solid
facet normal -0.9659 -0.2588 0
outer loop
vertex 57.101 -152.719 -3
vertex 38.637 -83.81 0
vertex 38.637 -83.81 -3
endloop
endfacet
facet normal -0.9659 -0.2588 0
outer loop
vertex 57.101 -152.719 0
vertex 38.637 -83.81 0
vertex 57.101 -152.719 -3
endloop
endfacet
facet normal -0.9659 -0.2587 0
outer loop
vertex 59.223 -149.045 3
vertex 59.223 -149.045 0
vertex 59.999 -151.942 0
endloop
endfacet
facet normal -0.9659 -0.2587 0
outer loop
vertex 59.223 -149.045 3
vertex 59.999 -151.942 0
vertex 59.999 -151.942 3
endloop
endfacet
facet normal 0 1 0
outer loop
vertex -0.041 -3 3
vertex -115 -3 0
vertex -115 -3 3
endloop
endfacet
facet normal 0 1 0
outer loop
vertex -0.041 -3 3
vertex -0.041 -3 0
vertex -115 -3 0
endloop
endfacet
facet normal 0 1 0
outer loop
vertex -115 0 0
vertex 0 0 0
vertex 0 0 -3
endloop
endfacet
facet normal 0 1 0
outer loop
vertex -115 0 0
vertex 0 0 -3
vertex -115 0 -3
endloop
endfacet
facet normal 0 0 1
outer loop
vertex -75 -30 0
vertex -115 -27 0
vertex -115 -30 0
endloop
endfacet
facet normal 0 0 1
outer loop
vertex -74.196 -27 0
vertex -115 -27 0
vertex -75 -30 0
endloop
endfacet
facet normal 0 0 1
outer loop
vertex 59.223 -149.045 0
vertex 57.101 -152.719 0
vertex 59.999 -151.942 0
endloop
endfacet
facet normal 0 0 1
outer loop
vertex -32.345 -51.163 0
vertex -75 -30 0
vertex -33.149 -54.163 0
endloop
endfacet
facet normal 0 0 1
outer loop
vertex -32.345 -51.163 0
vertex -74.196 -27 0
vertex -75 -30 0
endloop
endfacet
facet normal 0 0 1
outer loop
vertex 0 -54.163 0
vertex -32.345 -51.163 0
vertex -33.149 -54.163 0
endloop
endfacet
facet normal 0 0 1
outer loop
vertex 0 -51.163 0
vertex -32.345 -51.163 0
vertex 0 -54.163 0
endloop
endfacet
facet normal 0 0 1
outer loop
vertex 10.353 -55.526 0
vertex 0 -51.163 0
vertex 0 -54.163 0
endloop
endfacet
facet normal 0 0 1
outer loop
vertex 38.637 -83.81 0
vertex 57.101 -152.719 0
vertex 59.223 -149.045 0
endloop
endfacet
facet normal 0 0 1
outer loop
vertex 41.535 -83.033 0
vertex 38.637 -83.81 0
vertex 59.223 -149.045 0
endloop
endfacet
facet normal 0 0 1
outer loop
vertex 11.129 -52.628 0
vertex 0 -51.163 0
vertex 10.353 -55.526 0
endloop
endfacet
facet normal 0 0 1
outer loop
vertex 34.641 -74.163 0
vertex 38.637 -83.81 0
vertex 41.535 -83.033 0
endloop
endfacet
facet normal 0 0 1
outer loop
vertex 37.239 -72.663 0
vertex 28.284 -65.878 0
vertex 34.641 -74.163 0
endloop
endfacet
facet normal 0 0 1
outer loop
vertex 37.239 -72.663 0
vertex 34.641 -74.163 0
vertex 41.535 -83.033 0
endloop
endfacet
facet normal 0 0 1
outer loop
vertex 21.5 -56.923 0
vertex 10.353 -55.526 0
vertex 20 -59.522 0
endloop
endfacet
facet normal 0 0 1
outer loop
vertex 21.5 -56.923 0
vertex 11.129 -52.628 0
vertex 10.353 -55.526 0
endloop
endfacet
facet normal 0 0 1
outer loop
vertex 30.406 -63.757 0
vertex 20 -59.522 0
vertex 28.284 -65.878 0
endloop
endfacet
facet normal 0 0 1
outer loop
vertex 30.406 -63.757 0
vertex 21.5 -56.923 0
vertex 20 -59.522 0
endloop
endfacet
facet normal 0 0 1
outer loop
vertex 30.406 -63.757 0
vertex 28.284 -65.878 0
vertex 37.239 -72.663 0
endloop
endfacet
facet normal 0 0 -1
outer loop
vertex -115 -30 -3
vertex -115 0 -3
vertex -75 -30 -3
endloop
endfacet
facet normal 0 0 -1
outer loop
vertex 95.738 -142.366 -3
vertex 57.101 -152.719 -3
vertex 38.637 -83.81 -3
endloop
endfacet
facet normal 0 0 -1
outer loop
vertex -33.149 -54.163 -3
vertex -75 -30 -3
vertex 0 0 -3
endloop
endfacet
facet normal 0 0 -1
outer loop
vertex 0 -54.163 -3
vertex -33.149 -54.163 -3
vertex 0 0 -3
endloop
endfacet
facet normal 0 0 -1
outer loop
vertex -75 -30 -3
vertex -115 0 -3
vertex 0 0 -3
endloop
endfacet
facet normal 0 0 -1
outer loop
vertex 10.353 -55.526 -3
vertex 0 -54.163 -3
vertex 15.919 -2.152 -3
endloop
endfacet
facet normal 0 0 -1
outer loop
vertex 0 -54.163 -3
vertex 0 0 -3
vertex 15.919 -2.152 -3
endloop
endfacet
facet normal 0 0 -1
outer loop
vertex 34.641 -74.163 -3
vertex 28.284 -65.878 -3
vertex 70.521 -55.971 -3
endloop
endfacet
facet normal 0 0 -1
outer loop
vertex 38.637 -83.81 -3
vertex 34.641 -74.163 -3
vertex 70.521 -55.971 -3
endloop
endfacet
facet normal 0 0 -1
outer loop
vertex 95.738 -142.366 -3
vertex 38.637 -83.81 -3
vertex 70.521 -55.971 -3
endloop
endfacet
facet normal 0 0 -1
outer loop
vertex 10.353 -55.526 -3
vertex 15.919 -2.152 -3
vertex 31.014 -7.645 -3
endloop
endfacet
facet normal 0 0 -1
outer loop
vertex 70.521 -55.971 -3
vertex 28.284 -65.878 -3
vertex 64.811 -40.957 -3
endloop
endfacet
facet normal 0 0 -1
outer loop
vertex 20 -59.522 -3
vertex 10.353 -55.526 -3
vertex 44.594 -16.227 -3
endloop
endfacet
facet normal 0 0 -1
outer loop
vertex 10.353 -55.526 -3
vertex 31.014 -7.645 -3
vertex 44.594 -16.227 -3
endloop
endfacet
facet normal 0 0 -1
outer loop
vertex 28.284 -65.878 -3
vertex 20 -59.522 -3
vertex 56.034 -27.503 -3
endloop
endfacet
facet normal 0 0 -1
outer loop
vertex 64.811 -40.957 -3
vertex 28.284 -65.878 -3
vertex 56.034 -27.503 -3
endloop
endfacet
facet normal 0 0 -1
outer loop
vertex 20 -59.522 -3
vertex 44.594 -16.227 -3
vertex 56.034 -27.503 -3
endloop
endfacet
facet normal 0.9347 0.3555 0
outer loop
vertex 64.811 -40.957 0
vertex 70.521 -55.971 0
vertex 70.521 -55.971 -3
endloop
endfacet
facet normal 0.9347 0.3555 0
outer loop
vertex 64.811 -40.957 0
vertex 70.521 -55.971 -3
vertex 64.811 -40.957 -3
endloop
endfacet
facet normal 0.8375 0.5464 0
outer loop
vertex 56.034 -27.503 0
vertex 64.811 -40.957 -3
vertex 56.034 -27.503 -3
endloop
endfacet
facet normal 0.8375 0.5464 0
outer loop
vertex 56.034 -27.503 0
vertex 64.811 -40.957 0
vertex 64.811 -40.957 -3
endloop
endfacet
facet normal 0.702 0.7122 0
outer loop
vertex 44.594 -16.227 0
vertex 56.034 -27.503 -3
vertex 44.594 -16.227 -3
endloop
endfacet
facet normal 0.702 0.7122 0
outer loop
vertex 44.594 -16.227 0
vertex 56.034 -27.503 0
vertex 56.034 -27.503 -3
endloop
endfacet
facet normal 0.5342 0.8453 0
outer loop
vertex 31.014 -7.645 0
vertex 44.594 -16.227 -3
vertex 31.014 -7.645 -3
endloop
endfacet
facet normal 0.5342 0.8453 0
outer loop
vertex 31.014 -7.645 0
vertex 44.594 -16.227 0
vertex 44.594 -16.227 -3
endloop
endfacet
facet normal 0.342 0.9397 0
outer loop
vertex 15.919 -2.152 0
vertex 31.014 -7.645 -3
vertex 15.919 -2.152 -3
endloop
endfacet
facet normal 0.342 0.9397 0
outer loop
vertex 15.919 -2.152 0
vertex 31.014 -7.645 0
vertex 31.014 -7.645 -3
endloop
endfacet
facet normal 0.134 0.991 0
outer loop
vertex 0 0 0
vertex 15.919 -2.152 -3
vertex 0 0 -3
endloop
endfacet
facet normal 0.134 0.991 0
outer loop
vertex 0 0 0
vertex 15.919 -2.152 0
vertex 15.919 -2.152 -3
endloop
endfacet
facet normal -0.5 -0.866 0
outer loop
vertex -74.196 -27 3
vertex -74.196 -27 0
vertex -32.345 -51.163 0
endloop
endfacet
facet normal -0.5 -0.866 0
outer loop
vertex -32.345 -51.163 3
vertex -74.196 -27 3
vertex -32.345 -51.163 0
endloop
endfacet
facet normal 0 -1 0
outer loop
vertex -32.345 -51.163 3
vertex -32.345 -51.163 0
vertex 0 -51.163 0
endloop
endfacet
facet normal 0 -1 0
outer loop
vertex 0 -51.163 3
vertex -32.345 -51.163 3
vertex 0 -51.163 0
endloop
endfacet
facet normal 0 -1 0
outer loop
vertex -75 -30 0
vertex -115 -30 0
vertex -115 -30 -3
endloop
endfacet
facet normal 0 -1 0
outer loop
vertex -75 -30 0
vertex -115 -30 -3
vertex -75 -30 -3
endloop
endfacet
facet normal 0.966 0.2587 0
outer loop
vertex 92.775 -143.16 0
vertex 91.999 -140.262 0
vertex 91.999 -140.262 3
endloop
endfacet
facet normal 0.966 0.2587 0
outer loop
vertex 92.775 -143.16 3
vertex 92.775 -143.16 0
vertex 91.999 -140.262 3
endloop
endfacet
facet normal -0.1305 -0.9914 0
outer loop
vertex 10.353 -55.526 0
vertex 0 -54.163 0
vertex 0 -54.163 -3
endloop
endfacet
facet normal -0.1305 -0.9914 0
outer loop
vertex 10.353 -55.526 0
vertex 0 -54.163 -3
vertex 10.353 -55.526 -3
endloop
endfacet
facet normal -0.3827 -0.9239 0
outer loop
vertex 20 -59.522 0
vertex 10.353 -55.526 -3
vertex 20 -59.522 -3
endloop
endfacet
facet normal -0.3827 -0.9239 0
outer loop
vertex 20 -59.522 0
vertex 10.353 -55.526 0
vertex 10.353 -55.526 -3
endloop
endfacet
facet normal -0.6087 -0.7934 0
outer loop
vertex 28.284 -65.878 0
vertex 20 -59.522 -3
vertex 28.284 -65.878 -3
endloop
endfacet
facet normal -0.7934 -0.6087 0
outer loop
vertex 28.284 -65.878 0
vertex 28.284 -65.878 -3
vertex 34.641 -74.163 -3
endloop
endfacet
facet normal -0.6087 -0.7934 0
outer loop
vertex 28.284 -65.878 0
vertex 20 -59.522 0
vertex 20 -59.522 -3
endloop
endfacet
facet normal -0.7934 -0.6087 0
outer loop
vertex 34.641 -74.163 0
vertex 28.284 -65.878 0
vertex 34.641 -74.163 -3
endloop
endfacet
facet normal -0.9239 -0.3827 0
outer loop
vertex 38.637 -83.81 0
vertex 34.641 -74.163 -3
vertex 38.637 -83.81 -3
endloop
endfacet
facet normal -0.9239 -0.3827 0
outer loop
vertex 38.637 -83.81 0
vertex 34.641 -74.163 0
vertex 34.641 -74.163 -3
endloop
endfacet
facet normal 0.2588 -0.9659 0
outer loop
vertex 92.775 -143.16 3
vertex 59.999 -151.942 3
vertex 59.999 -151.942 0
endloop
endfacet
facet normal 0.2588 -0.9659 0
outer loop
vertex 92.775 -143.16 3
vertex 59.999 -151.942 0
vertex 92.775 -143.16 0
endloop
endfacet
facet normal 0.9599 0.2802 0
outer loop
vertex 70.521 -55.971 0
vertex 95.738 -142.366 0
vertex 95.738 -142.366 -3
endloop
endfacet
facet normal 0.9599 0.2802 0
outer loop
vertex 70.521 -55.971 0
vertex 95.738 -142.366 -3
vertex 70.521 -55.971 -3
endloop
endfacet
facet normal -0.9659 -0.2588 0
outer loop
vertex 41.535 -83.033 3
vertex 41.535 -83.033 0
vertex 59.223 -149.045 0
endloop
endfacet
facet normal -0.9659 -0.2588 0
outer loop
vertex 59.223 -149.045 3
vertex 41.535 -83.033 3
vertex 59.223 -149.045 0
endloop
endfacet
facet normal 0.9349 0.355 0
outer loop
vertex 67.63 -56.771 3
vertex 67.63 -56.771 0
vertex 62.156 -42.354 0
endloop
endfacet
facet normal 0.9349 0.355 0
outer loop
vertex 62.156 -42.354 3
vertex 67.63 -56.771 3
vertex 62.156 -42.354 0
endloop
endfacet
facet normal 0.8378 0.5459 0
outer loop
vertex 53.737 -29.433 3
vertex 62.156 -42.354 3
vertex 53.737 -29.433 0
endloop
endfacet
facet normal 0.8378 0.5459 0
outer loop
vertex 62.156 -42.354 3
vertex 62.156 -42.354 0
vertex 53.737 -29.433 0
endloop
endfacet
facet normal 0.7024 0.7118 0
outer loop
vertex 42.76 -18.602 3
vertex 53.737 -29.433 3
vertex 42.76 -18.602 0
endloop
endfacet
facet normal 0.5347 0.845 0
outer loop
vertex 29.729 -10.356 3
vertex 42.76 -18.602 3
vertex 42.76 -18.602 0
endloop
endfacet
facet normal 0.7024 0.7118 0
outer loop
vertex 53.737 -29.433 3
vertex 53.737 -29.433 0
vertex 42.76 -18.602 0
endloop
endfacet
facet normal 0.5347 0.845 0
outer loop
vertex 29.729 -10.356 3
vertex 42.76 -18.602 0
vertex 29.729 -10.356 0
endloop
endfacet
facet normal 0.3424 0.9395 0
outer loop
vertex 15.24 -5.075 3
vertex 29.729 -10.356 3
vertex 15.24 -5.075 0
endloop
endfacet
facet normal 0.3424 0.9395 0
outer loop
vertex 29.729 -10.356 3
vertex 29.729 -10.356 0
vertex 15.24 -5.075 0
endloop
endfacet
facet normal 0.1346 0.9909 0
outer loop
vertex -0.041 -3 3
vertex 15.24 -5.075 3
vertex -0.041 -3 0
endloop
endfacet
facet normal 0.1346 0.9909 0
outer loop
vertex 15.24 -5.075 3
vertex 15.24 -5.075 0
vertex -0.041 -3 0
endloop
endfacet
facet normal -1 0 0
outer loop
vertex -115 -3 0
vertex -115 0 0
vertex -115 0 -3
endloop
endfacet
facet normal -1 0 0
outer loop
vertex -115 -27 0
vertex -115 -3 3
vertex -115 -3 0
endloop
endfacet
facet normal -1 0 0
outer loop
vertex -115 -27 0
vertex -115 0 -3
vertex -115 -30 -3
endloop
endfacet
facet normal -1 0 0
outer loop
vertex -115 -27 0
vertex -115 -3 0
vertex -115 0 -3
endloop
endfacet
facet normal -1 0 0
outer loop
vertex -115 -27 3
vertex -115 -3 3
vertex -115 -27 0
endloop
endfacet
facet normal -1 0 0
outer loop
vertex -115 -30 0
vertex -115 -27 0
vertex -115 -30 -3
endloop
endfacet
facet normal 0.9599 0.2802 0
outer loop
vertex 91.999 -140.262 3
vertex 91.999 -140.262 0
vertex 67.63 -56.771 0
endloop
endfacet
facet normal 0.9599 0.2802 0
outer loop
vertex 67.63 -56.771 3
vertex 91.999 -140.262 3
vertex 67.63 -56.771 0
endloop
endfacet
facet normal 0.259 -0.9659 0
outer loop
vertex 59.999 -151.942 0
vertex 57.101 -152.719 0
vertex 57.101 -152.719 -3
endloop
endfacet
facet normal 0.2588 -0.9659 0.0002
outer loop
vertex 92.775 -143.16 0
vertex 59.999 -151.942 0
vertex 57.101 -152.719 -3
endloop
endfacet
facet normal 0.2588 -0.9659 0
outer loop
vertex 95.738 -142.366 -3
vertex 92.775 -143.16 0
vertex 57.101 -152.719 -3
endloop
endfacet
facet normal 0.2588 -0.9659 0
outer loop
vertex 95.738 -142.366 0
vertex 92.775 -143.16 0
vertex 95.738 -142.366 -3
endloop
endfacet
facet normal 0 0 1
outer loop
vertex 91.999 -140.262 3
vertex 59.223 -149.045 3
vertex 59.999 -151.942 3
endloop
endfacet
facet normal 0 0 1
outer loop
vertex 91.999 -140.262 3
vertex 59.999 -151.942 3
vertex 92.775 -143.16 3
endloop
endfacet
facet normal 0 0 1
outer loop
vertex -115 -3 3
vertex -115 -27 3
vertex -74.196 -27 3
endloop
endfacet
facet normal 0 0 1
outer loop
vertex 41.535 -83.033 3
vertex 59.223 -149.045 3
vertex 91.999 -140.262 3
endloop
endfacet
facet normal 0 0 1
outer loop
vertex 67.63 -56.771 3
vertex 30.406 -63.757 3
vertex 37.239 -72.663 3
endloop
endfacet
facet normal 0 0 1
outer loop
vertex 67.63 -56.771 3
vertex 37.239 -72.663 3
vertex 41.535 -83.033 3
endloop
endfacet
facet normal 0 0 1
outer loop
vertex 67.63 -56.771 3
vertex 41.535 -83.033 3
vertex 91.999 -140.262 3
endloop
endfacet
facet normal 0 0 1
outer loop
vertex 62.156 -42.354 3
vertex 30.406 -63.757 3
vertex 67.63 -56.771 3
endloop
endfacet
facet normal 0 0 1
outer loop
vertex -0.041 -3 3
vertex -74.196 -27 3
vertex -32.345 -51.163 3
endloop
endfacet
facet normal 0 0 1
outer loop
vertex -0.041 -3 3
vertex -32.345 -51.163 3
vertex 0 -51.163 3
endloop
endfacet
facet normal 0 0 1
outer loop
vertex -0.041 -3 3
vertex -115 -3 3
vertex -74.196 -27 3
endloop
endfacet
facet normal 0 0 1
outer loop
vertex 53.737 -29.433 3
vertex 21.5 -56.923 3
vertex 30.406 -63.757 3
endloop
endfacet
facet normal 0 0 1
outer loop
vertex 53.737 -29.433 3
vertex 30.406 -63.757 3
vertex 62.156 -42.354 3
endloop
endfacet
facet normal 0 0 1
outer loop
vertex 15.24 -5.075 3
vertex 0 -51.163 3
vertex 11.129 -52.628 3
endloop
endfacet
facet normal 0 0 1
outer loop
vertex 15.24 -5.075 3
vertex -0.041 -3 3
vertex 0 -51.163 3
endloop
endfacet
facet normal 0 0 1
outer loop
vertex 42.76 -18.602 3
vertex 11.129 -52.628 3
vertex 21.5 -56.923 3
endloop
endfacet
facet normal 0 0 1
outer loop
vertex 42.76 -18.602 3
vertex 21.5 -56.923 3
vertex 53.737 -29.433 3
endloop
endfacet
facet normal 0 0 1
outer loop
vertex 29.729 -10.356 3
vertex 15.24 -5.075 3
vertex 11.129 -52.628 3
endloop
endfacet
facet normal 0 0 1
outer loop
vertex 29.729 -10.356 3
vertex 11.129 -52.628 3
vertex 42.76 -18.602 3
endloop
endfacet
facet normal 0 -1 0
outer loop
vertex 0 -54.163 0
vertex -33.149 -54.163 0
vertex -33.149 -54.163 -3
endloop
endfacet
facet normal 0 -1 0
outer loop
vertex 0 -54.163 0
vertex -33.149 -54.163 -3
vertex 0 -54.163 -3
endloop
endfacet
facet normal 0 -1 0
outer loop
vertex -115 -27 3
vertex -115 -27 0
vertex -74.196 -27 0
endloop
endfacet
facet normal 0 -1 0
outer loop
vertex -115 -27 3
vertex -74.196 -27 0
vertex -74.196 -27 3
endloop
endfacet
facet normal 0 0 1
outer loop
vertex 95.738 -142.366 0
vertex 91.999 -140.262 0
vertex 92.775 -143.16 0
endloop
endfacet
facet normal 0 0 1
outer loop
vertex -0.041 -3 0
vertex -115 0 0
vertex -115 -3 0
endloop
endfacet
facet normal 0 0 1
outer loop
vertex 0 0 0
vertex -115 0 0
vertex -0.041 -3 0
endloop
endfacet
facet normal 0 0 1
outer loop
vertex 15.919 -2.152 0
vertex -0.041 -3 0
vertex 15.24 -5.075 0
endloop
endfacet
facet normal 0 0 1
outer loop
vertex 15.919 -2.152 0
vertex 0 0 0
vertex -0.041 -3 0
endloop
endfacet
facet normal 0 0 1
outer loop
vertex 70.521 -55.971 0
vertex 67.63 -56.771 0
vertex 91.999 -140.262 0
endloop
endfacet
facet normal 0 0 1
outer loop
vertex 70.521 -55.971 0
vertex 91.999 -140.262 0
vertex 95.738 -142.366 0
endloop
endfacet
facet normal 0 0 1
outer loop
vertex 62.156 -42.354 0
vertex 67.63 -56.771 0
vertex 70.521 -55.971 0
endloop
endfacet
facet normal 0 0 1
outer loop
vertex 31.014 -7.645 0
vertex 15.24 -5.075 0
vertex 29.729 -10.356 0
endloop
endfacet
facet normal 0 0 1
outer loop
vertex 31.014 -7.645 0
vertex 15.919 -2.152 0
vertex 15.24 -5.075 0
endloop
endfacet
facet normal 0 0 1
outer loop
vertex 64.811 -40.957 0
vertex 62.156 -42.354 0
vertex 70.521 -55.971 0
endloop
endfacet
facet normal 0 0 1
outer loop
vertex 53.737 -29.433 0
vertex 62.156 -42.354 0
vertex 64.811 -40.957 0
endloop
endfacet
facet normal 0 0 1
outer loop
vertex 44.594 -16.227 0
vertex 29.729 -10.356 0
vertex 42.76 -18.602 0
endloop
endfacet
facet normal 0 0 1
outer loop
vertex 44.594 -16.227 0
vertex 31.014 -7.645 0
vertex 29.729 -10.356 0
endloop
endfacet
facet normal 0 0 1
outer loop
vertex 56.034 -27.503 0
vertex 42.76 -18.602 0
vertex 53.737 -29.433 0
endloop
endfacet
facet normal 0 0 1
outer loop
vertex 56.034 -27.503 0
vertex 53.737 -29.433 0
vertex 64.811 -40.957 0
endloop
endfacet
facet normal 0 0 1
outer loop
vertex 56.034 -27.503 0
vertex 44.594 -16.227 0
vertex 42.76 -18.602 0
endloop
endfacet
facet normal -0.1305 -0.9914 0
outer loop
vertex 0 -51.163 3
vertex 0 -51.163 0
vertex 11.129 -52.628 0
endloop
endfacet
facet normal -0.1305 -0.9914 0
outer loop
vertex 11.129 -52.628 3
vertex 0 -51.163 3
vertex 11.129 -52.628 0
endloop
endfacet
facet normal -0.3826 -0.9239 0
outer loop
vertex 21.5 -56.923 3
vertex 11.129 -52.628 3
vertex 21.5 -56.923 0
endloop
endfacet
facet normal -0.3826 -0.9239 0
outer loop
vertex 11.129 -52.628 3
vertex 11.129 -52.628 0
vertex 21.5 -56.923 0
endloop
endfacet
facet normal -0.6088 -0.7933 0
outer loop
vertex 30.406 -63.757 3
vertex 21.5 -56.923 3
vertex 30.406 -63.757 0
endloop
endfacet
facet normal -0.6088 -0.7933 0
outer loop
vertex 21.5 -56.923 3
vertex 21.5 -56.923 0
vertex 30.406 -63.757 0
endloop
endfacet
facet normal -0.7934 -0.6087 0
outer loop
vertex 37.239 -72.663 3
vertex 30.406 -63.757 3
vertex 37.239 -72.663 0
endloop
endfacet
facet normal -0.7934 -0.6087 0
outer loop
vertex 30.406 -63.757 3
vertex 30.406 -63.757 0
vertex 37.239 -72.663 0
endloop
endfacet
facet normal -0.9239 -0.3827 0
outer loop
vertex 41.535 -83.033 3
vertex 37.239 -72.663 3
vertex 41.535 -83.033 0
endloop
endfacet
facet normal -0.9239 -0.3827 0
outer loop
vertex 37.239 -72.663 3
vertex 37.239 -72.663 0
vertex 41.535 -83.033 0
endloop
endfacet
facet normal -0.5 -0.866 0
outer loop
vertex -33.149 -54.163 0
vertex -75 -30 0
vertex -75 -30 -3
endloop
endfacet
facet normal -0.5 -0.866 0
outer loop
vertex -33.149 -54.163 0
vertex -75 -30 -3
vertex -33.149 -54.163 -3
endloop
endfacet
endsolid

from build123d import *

# Parameters (mm, degrees)
F1_DEPTH = 3
F3_DEPTH = 3
F4_W     = 24
F4_H     = 3
F5_DEPTH = 3
F6_W     = 33.9326828589
F6_H     = 3
F7_DEPTH = 3


with BuildPart() as f1:
    # F0 (on Top) → F1 (new body)
    with BuildSketch(Plane.XY):
        with BuildLine():
            ThreePointArc((70.5214165197, -55.9710955009), (44.5935670538, -16.2265064733), (0, 0))
            Line((0, 0), (-115, 0))
            Line((-115, 0), (-115, -30))
            Line((-115, -30), (-75, -30))
            Line((-75, -30), (-33.1492031744, -54.1625688131))
            Line((-33.1492031744, -54.1625688131), (0, -54.1625688131))
            ThreePointArc((0, -54.1625688131), (24.3504571603, -62.4284352014), (38.6370330516, -83.809807009))
            Line((38.6370330516, -83.809807009), (57.1011837292, -152.7189554564))
            Line((57.1011837292, -152.7189554564), (95.7382167807, -142.3661936523))
            Line((95.7382167807, -142.3661936523), (70.5214165197, -55.9710955009))
        make_face()
    extrude(amount=-F1_DEPTH)

    # F2 (on face) → F3 (join)
    with BuildSketch(Plane.XY):
        with BuildLine():
            ThreePointArc((0, -51.1625688131), (26.1767414474, -60.0483751805), (41.5348105304, -83.0333498737))
            Line((41.5348105304, -83.0333498737), (59.2225040727, -149.0447208423))
            Line((59.2225040727, -149.0447208423), (91.9989588014, -140.262296267))
            Line((91.9989588014, -140.262296267), (67.629756974, -56.7711490177))
            ThreePointArc((67.629756974, -56.7711490177), (42.7604972061, -18.6017091288), (-0.0410552786, -3))
            Line((-0.0410552786, -3), (-112, -3))
            Line((-112, -3), (-112, -27))
            Line((-112, -27), (-74.1961524227, -27))
            Line((-74.1961524227, -27), (-32.3453555971, -51.1625688131))
            Line((-32.3453555971, -51.1625688131), (0, -51.1625688131))
        make_face()
    extrude(amount=F3_DEPTH)

    # F4 (on face) → F5 (join)
    with BuildSketch(Plane(origin=(-112, 0, 0), x_dir=(0, -1, 0), z_dir=(-1, 0, 0))):
        with Locations((15, 1.5)):
            Rectangle(F4_W, F4_H)
    extrude(amount=F5_DEPTH)

    # F6 (on face) → F7 (join)
    with BuildSketch(Plane(origin=(41.2283357456, -153.866243714, 0), x_dir=(0.9659258263, 0.2588190451, 0), z_dir=(0.2588190451, -0.9659258263, 0))):
        with Locations((35.5952752848, 1.5)):
            Rectangle(F6_W, F6_H)
    extrude(amount=F7_DEPTH)


solid = f1.part
